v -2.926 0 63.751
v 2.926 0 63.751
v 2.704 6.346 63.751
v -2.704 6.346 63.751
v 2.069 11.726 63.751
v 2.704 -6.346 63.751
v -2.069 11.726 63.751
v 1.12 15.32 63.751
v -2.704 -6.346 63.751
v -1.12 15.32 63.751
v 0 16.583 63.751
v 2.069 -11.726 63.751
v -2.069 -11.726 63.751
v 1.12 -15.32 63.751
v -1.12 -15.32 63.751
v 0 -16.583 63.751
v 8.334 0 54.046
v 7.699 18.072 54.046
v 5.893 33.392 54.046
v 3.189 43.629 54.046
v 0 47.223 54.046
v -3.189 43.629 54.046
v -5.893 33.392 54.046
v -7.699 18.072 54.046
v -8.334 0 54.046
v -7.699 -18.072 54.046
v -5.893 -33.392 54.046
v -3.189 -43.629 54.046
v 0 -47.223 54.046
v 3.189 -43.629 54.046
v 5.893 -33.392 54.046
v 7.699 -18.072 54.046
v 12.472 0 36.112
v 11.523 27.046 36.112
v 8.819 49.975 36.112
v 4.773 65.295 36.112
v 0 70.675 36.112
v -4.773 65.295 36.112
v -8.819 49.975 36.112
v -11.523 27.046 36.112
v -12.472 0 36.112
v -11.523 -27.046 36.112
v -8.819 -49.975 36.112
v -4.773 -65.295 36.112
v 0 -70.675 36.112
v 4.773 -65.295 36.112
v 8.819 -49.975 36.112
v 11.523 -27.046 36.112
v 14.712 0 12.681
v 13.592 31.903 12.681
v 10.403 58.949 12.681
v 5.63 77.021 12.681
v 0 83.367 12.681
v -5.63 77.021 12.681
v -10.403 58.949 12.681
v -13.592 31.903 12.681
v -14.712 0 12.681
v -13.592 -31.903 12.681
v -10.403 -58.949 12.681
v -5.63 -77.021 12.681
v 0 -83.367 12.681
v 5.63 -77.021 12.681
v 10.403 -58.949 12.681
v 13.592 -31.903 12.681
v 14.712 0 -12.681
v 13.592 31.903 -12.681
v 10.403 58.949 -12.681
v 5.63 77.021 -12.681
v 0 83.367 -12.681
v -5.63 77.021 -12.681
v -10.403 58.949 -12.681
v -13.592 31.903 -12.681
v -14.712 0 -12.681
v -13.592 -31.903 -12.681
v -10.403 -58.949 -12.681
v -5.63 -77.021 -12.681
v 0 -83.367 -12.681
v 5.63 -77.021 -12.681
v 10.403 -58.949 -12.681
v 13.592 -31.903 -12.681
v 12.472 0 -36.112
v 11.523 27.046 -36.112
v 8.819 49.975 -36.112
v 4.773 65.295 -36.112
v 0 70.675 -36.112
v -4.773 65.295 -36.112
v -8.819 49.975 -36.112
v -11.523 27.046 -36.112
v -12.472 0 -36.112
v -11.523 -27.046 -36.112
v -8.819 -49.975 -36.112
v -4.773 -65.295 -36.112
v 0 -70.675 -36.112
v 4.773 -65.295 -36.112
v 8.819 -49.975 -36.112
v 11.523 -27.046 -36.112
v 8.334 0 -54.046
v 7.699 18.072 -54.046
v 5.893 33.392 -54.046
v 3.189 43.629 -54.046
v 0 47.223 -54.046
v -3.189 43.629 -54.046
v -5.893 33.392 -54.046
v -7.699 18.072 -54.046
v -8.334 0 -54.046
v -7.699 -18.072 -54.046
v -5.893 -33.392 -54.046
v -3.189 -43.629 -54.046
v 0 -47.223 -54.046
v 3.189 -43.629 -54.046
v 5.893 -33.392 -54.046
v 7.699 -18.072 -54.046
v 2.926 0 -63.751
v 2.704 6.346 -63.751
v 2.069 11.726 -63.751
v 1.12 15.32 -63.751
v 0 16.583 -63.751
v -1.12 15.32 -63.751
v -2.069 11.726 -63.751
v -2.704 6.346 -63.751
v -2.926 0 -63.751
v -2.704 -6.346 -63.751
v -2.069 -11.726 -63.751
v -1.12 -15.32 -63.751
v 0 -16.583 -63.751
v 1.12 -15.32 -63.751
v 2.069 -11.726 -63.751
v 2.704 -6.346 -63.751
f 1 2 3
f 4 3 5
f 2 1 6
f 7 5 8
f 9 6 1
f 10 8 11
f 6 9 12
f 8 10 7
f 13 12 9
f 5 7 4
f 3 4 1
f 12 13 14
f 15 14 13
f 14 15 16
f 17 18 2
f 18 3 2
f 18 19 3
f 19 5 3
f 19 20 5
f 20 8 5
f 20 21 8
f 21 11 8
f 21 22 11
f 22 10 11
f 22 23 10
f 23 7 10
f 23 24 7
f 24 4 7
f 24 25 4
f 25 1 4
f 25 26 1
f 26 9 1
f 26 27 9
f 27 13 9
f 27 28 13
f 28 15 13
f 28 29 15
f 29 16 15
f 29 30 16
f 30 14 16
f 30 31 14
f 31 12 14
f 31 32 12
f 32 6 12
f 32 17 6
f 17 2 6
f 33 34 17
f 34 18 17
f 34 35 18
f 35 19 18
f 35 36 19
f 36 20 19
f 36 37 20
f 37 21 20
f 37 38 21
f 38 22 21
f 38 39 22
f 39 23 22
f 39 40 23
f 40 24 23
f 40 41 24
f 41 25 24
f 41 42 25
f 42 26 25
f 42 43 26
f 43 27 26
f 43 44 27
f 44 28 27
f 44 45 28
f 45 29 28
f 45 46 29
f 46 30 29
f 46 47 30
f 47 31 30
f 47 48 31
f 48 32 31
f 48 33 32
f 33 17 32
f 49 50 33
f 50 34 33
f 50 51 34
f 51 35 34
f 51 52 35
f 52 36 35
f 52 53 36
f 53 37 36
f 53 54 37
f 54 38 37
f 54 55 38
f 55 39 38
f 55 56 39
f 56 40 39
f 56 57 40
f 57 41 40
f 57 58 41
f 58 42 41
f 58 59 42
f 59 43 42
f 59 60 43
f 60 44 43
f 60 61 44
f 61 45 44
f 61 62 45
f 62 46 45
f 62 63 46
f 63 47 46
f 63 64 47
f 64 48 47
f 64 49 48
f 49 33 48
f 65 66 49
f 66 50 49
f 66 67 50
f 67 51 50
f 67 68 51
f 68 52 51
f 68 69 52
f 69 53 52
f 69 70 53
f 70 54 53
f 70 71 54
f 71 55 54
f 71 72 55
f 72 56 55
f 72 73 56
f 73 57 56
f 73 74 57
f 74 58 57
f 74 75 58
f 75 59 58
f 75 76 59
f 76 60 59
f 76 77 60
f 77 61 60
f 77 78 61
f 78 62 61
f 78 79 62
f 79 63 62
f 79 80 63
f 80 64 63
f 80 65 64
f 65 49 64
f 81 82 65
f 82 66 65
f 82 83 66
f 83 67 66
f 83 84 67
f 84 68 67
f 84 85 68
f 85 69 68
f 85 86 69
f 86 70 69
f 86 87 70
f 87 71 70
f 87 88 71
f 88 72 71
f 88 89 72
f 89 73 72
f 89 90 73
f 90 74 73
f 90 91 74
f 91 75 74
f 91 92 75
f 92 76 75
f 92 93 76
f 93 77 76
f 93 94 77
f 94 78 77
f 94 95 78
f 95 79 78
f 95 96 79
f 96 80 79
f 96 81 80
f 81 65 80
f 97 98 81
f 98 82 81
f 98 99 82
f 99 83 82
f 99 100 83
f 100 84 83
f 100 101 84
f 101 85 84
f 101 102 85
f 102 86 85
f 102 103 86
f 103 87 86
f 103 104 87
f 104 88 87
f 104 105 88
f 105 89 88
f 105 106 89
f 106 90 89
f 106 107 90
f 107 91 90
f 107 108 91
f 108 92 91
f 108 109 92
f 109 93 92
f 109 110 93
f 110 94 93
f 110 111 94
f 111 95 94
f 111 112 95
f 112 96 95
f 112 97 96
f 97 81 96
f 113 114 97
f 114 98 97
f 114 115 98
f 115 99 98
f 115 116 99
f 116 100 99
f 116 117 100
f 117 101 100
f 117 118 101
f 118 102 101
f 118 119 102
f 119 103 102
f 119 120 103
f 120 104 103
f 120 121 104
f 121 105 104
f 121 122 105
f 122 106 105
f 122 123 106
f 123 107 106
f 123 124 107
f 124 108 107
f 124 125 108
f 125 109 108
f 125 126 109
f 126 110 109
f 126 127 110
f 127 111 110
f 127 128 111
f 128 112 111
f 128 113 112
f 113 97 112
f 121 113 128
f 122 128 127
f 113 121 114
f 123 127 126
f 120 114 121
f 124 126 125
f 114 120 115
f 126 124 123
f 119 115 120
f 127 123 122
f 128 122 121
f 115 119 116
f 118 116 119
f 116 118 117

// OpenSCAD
// Generated by SolidPython 1.0.1 on 2020-07-29 00:46:46


scale(v = [3, 17, 13]) {
	sphere(r = 5);
}
/***********************************************
*********      SolidPython code:      **********
************************************************
 
# import packages: SolidPython
from solid import *
from solid.utils import *
from itertools import chain, combinations, permutations


class Resize:

    def __init__(self, scad_file):
        self.scad_file = scad_file
        #self.scad_file = import_scad(scad_file)
        # cone/cylinder param:
        self.r1 = 0
        self.r2 = 0
        self.h = 0
        # rectangular prism param:
        self.w = 0
        self.l = 0
        # ellipse param:
        self.r = 0

    # import OpenScad code (file name corresponds to shape)


    # classify shape + parameters
    def assign(self, param1, param2, param3):
        if self.scad_file == 'cone.scad':
            self.r1 = param1
            self.r2 = param2
            self.h = param3
        elif self.scad_file == 'cylinder.scad':
            self.r1 = param1
            self.r2 = param2
            self.h = param3
        elif self.scad_file == 'rectangularPrism.scad':
            self.h = param1
            self.l = param2
            self.w = param3
        else:
            self.r = param1
            self.h = param2

    # resize parameters
    def iterate(self):
        x = range(3, 20, 2)
        i = 1
        if self.scad_file == 'cone.scad':
            tempList = list(permutations(x, 2))
            for temp in tempList:
                param1 = temp[0]
                param2 = temp[1]
                filepath = 'produced_scad_files/' + 'cone' + str(param1) + '_' + str(param2) + '_' + '.scad'
                scad_render_to_file(cylinder(h=param1, r1=param2, r2=0), filepath)

        elif self.scad_file == 'cylinder.scad':
            tempList = list(permutations(x, 3))
            for temp in tempList:
                param1 = temp[0]
                param2 = temp[1]
                filepath = 'produced_scad_files/' + 'cylinder' + str(param1) + '_' + str(param2) + '_' + '.scad'
                scad_render_to_file(cylinder(h=param1, r1=param2, r2=param2), filepath)

        elif self.scad_file == 'rectangularPrism.scad':
            tempList = list(permutations(x, 3))
            for temp in tempList:
                param1 = temp[0]
                param2 = temp[1]
                param3 = temp[2]
                filepath = 'produced_scad_files/' + 'rectangularPrism' + str(param1) + '_' + str(param2) + '_' + str(
                    param3) + '.scad'
                scad_render_to_file(cube(size=(param1, param2, param3)), filepath)

        elif self.scad_file == 'ellipse.scad':
            tempList = list(permutations(x, 4))
            for temp in tempList:
                param1 = temp[0]
                param2 = temp[1]
                param3 = temp[2]
                param4 = temp[3]
                filepath = 'produced_scad_files/' + 'ellipse' + str(param1) + '_' + str(param2) + '_' + str(param3) + '_' + str(param4) + '.scad'
                scad_render_to_file(scale([param1, param2, param3])(sphere(r=param4)), filepath)

    def render_to_scadfile(self):
        scad_render_to_file(scad, 'example.scad') 
 
************************************************/
